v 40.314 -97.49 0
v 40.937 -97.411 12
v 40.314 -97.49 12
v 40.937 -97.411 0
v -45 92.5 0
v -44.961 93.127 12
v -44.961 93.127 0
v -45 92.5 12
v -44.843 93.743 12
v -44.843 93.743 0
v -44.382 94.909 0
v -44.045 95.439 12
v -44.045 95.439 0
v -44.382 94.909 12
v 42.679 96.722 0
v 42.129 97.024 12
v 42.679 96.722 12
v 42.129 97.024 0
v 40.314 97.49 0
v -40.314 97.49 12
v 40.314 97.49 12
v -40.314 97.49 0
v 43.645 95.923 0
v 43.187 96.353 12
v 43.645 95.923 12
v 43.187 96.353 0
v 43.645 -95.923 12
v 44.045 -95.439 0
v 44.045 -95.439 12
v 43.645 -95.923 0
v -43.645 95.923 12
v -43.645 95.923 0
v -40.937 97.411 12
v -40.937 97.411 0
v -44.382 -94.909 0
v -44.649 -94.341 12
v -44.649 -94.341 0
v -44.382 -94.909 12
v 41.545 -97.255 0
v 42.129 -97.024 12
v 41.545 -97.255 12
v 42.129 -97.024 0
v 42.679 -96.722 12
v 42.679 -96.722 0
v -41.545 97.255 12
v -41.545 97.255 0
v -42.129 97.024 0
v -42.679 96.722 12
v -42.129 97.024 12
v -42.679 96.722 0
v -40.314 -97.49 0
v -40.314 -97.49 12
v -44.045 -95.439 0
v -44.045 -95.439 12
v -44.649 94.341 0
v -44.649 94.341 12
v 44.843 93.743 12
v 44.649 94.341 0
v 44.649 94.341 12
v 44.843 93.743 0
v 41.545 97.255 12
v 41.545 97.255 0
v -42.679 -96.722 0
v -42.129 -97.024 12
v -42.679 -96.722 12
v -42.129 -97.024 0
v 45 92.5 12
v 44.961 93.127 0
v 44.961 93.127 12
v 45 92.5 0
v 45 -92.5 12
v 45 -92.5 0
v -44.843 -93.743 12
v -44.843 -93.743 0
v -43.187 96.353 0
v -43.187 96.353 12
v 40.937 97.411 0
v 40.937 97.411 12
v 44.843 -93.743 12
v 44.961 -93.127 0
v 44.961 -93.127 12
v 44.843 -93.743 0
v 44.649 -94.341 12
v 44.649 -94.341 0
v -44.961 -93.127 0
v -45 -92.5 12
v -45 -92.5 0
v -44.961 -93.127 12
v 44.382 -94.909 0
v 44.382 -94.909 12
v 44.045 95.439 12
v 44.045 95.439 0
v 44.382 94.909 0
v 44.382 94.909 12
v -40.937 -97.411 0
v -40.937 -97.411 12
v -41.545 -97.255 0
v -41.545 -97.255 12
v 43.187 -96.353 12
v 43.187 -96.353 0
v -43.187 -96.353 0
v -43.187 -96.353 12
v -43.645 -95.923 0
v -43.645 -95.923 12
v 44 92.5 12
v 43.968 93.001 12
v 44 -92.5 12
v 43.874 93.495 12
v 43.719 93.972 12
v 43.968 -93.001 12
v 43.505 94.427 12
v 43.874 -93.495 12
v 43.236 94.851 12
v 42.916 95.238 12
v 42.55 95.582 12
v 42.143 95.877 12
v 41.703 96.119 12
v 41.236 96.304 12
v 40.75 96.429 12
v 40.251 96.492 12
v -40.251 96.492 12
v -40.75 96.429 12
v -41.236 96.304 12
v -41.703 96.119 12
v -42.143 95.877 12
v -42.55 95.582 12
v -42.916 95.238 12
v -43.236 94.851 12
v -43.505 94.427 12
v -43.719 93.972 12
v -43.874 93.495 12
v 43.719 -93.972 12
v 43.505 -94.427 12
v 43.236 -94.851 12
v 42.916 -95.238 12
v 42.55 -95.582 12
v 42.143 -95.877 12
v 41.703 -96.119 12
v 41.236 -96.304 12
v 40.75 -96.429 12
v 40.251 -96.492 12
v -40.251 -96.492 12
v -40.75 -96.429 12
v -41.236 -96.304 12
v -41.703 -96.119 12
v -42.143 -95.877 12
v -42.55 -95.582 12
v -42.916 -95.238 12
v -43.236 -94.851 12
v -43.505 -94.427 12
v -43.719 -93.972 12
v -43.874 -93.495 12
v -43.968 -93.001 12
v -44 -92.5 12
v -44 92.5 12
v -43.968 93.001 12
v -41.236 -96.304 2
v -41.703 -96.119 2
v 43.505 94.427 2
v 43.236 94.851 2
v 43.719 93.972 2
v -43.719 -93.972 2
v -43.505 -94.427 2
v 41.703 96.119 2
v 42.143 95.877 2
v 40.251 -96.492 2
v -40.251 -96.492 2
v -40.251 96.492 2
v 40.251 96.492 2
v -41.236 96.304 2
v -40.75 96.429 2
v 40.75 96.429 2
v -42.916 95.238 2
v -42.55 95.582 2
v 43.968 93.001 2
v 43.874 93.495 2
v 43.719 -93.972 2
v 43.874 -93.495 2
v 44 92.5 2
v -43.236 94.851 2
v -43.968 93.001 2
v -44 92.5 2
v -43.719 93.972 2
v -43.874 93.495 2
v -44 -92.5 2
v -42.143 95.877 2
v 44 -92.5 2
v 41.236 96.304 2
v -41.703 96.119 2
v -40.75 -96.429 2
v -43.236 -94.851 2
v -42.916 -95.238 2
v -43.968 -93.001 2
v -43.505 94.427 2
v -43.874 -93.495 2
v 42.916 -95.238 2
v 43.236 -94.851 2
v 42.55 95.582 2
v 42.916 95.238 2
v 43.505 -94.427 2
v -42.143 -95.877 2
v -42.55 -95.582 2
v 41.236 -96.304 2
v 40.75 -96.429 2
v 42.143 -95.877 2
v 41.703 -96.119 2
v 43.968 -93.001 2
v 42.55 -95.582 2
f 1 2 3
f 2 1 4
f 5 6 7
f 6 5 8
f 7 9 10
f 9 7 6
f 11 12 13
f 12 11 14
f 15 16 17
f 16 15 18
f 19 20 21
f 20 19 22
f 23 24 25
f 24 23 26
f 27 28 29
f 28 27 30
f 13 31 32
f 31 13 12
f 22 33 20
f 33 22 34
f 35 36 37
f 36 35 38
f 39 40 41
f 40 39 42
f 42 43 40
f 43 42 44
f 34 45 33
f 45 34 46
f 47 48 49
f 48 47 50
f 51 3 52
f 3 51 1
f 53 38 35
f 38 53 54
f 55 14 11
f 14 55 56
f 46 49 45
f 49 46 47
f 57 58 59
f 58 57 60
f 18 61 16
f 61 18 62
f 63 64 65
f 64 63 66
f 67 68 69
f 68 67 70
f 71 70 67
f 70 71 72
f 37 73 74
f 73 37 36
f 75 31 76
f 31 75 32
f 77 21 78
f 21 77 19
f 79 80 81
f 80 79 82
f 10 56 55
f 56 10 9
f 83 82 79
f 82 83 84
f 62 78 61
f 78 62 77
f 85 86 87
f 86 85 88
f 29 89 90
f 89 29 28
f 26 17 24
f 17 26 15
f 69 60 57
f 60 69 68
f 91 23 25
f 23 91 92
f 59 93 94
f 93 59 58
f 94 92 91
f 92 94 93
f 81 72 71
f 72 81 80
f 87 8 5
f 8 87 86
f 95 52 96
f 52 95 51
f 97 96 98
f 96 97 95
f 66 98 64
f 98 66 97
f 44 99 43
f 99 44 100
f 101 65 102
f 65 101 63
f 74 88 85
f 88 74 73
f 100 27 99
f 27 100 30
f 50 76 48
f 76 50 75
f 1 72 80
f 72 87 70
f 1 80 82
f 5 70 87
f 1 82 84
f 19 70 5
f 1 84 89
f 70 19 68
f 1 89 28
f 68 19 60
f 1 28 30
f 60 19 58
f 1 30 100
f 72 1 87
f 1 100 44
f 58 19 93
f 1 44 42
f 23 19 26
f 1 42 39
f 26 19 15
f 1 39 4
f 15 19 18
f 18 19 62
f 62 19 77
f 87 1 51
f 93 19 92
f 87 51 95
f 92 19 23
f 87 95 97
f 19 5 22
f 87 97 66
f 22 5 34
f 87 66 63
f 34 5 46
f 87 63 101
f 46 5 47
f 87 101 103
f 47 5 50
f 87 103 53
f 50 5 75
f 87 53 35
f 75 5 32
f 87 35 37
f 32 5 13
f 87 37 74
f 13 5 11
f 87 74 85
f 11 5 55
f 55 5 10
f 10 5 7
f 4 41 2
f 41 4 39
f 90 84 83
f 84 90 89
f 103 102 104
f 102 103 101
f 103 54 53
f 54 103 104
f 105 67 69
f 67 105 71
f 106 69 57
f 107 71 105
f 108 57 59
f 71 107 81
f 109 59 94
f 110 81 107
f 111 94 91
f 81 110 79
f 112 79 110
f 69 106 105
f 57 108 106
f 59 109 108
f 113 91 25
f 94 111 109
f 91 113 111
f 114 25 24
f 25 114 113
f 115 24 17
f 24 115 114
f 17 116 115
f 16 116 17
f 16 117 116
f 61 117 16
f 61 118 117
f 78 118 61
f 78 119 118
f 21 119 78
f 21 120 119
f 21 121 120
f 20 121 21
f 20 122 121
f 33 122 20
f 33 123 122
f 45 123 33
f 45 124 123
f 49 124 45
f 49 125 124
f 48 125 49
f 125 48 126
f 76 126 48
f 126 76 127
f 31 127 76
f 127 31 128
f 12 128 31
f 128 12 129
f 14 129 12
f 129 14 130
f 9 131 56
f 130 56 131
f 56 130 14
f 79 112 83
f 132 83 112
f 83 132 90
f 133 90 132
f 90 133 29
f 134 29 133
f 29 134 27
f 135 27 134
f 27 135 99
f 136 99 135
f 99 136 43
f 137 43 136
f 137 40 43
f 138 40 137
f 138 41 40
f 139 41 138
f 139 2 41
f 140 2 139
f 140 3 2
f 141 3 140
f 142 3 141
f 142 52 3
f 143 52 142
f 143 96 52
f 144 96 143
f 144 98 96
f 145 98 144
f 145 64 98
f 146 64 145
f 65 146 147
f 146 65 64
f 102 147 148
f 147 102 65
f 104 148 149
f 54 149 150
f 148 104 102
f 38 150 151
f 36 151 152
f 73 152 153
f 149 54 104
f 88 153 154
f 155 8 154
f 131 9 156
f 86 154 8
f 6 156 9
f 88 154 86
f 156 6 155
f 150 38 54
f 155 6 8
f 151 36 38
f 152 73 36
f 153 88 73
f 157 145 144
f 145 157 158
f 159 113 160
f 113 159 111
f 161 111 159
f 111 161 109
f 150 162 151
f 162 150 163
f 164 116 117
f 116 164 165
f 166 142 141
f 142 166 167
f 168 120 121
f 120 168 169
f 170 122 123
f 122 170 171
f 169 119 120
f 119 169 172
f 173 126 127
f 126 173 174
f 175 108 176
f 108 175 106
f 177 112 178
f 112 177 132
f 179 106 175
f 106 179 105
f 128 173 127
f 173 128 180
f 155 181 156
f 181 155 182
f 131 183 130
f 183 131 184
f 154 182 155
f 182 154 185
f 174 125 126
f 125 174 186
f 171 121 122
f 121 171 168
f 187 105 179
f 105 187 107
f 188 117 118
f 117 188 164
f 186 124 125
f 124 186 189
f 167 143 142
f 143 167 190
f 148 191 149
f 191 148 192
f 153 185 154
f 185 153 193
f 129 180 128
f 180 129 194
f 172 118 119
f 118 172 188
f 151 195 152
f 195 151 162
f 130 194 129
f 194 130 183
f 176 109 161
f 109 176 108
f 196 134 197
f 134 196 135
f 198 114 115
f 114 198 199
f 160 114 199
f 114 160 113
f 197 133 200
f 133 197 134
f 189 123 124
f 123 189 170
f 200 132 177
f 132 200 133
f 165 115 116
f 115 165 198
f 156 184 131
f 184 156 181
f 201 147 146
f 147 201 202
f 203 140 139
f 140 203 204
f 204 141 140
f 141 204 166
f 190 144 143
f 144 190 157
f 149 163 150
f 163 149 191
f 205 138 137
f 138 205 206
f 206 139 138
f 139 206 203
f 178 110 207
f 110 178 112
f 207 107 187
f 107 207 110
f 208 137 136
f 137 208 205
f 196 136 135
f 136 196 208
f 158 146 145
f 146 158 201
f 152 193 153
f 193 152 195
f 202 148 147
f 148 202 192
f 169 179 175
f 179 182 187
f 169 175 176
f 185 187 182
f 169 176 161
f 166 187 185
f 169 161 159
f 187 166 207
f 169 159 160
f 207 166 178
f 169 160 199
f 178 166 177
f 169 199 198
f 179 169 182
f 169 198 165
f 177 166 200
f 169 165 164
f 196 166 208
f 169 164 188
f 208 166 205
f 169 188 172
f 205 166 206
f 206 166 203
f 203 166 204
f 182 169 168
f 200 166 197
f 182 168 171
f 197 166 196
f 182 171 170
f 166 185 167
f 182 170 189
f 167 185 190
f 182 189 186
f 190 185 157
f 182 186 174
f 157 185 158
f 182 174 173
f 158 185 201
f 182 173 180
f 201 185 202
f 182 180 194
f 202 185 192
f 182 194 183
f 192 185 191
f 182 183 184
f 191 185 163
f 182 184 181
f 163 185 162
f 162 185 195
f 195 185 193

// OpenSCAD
$fn = 50;


difference() {
	union() {
		hull() {
			translate(v = [-40.0000000000, 92.5000000000, 0]) {
				cylinder(h = 12, r = 5);
			}
			translate(v = [40.0000000000, 92.5000000000, 0]) {
				cylinder(h = 12, r = 5);
			}
			translate(v = [-40.0000000000, -92.5000000000, 0]) {
				cylinder(h = 12, r = 5);
			}
			translate(v = [40.0000000000, -92.5000000000, 0]) {
				cylinder(h = 12, r = 5);
			}
		}
	}
	union() {
		translate(v = [0, 0, 2]) {
			hull() {
				translate(v = [-40.0000000000, 92.5000000000, 0]) {
					cylinder(h = 10, r = 4);
				}
				translate(v = [40.0000000000, 92.5000000000, 0]) {
					cylinder(h = 10, r = 4);
				}
				translate(v = [-40.0000000000, -92.5000000000, 0]) {
					cylinder(h = 10, r = 4);
				}
				translate(v = [40.0000000000, -92.5000000000, 0]) {
					cylinder(h = 10, r = 4);
				}
			}
		}
	}
}
